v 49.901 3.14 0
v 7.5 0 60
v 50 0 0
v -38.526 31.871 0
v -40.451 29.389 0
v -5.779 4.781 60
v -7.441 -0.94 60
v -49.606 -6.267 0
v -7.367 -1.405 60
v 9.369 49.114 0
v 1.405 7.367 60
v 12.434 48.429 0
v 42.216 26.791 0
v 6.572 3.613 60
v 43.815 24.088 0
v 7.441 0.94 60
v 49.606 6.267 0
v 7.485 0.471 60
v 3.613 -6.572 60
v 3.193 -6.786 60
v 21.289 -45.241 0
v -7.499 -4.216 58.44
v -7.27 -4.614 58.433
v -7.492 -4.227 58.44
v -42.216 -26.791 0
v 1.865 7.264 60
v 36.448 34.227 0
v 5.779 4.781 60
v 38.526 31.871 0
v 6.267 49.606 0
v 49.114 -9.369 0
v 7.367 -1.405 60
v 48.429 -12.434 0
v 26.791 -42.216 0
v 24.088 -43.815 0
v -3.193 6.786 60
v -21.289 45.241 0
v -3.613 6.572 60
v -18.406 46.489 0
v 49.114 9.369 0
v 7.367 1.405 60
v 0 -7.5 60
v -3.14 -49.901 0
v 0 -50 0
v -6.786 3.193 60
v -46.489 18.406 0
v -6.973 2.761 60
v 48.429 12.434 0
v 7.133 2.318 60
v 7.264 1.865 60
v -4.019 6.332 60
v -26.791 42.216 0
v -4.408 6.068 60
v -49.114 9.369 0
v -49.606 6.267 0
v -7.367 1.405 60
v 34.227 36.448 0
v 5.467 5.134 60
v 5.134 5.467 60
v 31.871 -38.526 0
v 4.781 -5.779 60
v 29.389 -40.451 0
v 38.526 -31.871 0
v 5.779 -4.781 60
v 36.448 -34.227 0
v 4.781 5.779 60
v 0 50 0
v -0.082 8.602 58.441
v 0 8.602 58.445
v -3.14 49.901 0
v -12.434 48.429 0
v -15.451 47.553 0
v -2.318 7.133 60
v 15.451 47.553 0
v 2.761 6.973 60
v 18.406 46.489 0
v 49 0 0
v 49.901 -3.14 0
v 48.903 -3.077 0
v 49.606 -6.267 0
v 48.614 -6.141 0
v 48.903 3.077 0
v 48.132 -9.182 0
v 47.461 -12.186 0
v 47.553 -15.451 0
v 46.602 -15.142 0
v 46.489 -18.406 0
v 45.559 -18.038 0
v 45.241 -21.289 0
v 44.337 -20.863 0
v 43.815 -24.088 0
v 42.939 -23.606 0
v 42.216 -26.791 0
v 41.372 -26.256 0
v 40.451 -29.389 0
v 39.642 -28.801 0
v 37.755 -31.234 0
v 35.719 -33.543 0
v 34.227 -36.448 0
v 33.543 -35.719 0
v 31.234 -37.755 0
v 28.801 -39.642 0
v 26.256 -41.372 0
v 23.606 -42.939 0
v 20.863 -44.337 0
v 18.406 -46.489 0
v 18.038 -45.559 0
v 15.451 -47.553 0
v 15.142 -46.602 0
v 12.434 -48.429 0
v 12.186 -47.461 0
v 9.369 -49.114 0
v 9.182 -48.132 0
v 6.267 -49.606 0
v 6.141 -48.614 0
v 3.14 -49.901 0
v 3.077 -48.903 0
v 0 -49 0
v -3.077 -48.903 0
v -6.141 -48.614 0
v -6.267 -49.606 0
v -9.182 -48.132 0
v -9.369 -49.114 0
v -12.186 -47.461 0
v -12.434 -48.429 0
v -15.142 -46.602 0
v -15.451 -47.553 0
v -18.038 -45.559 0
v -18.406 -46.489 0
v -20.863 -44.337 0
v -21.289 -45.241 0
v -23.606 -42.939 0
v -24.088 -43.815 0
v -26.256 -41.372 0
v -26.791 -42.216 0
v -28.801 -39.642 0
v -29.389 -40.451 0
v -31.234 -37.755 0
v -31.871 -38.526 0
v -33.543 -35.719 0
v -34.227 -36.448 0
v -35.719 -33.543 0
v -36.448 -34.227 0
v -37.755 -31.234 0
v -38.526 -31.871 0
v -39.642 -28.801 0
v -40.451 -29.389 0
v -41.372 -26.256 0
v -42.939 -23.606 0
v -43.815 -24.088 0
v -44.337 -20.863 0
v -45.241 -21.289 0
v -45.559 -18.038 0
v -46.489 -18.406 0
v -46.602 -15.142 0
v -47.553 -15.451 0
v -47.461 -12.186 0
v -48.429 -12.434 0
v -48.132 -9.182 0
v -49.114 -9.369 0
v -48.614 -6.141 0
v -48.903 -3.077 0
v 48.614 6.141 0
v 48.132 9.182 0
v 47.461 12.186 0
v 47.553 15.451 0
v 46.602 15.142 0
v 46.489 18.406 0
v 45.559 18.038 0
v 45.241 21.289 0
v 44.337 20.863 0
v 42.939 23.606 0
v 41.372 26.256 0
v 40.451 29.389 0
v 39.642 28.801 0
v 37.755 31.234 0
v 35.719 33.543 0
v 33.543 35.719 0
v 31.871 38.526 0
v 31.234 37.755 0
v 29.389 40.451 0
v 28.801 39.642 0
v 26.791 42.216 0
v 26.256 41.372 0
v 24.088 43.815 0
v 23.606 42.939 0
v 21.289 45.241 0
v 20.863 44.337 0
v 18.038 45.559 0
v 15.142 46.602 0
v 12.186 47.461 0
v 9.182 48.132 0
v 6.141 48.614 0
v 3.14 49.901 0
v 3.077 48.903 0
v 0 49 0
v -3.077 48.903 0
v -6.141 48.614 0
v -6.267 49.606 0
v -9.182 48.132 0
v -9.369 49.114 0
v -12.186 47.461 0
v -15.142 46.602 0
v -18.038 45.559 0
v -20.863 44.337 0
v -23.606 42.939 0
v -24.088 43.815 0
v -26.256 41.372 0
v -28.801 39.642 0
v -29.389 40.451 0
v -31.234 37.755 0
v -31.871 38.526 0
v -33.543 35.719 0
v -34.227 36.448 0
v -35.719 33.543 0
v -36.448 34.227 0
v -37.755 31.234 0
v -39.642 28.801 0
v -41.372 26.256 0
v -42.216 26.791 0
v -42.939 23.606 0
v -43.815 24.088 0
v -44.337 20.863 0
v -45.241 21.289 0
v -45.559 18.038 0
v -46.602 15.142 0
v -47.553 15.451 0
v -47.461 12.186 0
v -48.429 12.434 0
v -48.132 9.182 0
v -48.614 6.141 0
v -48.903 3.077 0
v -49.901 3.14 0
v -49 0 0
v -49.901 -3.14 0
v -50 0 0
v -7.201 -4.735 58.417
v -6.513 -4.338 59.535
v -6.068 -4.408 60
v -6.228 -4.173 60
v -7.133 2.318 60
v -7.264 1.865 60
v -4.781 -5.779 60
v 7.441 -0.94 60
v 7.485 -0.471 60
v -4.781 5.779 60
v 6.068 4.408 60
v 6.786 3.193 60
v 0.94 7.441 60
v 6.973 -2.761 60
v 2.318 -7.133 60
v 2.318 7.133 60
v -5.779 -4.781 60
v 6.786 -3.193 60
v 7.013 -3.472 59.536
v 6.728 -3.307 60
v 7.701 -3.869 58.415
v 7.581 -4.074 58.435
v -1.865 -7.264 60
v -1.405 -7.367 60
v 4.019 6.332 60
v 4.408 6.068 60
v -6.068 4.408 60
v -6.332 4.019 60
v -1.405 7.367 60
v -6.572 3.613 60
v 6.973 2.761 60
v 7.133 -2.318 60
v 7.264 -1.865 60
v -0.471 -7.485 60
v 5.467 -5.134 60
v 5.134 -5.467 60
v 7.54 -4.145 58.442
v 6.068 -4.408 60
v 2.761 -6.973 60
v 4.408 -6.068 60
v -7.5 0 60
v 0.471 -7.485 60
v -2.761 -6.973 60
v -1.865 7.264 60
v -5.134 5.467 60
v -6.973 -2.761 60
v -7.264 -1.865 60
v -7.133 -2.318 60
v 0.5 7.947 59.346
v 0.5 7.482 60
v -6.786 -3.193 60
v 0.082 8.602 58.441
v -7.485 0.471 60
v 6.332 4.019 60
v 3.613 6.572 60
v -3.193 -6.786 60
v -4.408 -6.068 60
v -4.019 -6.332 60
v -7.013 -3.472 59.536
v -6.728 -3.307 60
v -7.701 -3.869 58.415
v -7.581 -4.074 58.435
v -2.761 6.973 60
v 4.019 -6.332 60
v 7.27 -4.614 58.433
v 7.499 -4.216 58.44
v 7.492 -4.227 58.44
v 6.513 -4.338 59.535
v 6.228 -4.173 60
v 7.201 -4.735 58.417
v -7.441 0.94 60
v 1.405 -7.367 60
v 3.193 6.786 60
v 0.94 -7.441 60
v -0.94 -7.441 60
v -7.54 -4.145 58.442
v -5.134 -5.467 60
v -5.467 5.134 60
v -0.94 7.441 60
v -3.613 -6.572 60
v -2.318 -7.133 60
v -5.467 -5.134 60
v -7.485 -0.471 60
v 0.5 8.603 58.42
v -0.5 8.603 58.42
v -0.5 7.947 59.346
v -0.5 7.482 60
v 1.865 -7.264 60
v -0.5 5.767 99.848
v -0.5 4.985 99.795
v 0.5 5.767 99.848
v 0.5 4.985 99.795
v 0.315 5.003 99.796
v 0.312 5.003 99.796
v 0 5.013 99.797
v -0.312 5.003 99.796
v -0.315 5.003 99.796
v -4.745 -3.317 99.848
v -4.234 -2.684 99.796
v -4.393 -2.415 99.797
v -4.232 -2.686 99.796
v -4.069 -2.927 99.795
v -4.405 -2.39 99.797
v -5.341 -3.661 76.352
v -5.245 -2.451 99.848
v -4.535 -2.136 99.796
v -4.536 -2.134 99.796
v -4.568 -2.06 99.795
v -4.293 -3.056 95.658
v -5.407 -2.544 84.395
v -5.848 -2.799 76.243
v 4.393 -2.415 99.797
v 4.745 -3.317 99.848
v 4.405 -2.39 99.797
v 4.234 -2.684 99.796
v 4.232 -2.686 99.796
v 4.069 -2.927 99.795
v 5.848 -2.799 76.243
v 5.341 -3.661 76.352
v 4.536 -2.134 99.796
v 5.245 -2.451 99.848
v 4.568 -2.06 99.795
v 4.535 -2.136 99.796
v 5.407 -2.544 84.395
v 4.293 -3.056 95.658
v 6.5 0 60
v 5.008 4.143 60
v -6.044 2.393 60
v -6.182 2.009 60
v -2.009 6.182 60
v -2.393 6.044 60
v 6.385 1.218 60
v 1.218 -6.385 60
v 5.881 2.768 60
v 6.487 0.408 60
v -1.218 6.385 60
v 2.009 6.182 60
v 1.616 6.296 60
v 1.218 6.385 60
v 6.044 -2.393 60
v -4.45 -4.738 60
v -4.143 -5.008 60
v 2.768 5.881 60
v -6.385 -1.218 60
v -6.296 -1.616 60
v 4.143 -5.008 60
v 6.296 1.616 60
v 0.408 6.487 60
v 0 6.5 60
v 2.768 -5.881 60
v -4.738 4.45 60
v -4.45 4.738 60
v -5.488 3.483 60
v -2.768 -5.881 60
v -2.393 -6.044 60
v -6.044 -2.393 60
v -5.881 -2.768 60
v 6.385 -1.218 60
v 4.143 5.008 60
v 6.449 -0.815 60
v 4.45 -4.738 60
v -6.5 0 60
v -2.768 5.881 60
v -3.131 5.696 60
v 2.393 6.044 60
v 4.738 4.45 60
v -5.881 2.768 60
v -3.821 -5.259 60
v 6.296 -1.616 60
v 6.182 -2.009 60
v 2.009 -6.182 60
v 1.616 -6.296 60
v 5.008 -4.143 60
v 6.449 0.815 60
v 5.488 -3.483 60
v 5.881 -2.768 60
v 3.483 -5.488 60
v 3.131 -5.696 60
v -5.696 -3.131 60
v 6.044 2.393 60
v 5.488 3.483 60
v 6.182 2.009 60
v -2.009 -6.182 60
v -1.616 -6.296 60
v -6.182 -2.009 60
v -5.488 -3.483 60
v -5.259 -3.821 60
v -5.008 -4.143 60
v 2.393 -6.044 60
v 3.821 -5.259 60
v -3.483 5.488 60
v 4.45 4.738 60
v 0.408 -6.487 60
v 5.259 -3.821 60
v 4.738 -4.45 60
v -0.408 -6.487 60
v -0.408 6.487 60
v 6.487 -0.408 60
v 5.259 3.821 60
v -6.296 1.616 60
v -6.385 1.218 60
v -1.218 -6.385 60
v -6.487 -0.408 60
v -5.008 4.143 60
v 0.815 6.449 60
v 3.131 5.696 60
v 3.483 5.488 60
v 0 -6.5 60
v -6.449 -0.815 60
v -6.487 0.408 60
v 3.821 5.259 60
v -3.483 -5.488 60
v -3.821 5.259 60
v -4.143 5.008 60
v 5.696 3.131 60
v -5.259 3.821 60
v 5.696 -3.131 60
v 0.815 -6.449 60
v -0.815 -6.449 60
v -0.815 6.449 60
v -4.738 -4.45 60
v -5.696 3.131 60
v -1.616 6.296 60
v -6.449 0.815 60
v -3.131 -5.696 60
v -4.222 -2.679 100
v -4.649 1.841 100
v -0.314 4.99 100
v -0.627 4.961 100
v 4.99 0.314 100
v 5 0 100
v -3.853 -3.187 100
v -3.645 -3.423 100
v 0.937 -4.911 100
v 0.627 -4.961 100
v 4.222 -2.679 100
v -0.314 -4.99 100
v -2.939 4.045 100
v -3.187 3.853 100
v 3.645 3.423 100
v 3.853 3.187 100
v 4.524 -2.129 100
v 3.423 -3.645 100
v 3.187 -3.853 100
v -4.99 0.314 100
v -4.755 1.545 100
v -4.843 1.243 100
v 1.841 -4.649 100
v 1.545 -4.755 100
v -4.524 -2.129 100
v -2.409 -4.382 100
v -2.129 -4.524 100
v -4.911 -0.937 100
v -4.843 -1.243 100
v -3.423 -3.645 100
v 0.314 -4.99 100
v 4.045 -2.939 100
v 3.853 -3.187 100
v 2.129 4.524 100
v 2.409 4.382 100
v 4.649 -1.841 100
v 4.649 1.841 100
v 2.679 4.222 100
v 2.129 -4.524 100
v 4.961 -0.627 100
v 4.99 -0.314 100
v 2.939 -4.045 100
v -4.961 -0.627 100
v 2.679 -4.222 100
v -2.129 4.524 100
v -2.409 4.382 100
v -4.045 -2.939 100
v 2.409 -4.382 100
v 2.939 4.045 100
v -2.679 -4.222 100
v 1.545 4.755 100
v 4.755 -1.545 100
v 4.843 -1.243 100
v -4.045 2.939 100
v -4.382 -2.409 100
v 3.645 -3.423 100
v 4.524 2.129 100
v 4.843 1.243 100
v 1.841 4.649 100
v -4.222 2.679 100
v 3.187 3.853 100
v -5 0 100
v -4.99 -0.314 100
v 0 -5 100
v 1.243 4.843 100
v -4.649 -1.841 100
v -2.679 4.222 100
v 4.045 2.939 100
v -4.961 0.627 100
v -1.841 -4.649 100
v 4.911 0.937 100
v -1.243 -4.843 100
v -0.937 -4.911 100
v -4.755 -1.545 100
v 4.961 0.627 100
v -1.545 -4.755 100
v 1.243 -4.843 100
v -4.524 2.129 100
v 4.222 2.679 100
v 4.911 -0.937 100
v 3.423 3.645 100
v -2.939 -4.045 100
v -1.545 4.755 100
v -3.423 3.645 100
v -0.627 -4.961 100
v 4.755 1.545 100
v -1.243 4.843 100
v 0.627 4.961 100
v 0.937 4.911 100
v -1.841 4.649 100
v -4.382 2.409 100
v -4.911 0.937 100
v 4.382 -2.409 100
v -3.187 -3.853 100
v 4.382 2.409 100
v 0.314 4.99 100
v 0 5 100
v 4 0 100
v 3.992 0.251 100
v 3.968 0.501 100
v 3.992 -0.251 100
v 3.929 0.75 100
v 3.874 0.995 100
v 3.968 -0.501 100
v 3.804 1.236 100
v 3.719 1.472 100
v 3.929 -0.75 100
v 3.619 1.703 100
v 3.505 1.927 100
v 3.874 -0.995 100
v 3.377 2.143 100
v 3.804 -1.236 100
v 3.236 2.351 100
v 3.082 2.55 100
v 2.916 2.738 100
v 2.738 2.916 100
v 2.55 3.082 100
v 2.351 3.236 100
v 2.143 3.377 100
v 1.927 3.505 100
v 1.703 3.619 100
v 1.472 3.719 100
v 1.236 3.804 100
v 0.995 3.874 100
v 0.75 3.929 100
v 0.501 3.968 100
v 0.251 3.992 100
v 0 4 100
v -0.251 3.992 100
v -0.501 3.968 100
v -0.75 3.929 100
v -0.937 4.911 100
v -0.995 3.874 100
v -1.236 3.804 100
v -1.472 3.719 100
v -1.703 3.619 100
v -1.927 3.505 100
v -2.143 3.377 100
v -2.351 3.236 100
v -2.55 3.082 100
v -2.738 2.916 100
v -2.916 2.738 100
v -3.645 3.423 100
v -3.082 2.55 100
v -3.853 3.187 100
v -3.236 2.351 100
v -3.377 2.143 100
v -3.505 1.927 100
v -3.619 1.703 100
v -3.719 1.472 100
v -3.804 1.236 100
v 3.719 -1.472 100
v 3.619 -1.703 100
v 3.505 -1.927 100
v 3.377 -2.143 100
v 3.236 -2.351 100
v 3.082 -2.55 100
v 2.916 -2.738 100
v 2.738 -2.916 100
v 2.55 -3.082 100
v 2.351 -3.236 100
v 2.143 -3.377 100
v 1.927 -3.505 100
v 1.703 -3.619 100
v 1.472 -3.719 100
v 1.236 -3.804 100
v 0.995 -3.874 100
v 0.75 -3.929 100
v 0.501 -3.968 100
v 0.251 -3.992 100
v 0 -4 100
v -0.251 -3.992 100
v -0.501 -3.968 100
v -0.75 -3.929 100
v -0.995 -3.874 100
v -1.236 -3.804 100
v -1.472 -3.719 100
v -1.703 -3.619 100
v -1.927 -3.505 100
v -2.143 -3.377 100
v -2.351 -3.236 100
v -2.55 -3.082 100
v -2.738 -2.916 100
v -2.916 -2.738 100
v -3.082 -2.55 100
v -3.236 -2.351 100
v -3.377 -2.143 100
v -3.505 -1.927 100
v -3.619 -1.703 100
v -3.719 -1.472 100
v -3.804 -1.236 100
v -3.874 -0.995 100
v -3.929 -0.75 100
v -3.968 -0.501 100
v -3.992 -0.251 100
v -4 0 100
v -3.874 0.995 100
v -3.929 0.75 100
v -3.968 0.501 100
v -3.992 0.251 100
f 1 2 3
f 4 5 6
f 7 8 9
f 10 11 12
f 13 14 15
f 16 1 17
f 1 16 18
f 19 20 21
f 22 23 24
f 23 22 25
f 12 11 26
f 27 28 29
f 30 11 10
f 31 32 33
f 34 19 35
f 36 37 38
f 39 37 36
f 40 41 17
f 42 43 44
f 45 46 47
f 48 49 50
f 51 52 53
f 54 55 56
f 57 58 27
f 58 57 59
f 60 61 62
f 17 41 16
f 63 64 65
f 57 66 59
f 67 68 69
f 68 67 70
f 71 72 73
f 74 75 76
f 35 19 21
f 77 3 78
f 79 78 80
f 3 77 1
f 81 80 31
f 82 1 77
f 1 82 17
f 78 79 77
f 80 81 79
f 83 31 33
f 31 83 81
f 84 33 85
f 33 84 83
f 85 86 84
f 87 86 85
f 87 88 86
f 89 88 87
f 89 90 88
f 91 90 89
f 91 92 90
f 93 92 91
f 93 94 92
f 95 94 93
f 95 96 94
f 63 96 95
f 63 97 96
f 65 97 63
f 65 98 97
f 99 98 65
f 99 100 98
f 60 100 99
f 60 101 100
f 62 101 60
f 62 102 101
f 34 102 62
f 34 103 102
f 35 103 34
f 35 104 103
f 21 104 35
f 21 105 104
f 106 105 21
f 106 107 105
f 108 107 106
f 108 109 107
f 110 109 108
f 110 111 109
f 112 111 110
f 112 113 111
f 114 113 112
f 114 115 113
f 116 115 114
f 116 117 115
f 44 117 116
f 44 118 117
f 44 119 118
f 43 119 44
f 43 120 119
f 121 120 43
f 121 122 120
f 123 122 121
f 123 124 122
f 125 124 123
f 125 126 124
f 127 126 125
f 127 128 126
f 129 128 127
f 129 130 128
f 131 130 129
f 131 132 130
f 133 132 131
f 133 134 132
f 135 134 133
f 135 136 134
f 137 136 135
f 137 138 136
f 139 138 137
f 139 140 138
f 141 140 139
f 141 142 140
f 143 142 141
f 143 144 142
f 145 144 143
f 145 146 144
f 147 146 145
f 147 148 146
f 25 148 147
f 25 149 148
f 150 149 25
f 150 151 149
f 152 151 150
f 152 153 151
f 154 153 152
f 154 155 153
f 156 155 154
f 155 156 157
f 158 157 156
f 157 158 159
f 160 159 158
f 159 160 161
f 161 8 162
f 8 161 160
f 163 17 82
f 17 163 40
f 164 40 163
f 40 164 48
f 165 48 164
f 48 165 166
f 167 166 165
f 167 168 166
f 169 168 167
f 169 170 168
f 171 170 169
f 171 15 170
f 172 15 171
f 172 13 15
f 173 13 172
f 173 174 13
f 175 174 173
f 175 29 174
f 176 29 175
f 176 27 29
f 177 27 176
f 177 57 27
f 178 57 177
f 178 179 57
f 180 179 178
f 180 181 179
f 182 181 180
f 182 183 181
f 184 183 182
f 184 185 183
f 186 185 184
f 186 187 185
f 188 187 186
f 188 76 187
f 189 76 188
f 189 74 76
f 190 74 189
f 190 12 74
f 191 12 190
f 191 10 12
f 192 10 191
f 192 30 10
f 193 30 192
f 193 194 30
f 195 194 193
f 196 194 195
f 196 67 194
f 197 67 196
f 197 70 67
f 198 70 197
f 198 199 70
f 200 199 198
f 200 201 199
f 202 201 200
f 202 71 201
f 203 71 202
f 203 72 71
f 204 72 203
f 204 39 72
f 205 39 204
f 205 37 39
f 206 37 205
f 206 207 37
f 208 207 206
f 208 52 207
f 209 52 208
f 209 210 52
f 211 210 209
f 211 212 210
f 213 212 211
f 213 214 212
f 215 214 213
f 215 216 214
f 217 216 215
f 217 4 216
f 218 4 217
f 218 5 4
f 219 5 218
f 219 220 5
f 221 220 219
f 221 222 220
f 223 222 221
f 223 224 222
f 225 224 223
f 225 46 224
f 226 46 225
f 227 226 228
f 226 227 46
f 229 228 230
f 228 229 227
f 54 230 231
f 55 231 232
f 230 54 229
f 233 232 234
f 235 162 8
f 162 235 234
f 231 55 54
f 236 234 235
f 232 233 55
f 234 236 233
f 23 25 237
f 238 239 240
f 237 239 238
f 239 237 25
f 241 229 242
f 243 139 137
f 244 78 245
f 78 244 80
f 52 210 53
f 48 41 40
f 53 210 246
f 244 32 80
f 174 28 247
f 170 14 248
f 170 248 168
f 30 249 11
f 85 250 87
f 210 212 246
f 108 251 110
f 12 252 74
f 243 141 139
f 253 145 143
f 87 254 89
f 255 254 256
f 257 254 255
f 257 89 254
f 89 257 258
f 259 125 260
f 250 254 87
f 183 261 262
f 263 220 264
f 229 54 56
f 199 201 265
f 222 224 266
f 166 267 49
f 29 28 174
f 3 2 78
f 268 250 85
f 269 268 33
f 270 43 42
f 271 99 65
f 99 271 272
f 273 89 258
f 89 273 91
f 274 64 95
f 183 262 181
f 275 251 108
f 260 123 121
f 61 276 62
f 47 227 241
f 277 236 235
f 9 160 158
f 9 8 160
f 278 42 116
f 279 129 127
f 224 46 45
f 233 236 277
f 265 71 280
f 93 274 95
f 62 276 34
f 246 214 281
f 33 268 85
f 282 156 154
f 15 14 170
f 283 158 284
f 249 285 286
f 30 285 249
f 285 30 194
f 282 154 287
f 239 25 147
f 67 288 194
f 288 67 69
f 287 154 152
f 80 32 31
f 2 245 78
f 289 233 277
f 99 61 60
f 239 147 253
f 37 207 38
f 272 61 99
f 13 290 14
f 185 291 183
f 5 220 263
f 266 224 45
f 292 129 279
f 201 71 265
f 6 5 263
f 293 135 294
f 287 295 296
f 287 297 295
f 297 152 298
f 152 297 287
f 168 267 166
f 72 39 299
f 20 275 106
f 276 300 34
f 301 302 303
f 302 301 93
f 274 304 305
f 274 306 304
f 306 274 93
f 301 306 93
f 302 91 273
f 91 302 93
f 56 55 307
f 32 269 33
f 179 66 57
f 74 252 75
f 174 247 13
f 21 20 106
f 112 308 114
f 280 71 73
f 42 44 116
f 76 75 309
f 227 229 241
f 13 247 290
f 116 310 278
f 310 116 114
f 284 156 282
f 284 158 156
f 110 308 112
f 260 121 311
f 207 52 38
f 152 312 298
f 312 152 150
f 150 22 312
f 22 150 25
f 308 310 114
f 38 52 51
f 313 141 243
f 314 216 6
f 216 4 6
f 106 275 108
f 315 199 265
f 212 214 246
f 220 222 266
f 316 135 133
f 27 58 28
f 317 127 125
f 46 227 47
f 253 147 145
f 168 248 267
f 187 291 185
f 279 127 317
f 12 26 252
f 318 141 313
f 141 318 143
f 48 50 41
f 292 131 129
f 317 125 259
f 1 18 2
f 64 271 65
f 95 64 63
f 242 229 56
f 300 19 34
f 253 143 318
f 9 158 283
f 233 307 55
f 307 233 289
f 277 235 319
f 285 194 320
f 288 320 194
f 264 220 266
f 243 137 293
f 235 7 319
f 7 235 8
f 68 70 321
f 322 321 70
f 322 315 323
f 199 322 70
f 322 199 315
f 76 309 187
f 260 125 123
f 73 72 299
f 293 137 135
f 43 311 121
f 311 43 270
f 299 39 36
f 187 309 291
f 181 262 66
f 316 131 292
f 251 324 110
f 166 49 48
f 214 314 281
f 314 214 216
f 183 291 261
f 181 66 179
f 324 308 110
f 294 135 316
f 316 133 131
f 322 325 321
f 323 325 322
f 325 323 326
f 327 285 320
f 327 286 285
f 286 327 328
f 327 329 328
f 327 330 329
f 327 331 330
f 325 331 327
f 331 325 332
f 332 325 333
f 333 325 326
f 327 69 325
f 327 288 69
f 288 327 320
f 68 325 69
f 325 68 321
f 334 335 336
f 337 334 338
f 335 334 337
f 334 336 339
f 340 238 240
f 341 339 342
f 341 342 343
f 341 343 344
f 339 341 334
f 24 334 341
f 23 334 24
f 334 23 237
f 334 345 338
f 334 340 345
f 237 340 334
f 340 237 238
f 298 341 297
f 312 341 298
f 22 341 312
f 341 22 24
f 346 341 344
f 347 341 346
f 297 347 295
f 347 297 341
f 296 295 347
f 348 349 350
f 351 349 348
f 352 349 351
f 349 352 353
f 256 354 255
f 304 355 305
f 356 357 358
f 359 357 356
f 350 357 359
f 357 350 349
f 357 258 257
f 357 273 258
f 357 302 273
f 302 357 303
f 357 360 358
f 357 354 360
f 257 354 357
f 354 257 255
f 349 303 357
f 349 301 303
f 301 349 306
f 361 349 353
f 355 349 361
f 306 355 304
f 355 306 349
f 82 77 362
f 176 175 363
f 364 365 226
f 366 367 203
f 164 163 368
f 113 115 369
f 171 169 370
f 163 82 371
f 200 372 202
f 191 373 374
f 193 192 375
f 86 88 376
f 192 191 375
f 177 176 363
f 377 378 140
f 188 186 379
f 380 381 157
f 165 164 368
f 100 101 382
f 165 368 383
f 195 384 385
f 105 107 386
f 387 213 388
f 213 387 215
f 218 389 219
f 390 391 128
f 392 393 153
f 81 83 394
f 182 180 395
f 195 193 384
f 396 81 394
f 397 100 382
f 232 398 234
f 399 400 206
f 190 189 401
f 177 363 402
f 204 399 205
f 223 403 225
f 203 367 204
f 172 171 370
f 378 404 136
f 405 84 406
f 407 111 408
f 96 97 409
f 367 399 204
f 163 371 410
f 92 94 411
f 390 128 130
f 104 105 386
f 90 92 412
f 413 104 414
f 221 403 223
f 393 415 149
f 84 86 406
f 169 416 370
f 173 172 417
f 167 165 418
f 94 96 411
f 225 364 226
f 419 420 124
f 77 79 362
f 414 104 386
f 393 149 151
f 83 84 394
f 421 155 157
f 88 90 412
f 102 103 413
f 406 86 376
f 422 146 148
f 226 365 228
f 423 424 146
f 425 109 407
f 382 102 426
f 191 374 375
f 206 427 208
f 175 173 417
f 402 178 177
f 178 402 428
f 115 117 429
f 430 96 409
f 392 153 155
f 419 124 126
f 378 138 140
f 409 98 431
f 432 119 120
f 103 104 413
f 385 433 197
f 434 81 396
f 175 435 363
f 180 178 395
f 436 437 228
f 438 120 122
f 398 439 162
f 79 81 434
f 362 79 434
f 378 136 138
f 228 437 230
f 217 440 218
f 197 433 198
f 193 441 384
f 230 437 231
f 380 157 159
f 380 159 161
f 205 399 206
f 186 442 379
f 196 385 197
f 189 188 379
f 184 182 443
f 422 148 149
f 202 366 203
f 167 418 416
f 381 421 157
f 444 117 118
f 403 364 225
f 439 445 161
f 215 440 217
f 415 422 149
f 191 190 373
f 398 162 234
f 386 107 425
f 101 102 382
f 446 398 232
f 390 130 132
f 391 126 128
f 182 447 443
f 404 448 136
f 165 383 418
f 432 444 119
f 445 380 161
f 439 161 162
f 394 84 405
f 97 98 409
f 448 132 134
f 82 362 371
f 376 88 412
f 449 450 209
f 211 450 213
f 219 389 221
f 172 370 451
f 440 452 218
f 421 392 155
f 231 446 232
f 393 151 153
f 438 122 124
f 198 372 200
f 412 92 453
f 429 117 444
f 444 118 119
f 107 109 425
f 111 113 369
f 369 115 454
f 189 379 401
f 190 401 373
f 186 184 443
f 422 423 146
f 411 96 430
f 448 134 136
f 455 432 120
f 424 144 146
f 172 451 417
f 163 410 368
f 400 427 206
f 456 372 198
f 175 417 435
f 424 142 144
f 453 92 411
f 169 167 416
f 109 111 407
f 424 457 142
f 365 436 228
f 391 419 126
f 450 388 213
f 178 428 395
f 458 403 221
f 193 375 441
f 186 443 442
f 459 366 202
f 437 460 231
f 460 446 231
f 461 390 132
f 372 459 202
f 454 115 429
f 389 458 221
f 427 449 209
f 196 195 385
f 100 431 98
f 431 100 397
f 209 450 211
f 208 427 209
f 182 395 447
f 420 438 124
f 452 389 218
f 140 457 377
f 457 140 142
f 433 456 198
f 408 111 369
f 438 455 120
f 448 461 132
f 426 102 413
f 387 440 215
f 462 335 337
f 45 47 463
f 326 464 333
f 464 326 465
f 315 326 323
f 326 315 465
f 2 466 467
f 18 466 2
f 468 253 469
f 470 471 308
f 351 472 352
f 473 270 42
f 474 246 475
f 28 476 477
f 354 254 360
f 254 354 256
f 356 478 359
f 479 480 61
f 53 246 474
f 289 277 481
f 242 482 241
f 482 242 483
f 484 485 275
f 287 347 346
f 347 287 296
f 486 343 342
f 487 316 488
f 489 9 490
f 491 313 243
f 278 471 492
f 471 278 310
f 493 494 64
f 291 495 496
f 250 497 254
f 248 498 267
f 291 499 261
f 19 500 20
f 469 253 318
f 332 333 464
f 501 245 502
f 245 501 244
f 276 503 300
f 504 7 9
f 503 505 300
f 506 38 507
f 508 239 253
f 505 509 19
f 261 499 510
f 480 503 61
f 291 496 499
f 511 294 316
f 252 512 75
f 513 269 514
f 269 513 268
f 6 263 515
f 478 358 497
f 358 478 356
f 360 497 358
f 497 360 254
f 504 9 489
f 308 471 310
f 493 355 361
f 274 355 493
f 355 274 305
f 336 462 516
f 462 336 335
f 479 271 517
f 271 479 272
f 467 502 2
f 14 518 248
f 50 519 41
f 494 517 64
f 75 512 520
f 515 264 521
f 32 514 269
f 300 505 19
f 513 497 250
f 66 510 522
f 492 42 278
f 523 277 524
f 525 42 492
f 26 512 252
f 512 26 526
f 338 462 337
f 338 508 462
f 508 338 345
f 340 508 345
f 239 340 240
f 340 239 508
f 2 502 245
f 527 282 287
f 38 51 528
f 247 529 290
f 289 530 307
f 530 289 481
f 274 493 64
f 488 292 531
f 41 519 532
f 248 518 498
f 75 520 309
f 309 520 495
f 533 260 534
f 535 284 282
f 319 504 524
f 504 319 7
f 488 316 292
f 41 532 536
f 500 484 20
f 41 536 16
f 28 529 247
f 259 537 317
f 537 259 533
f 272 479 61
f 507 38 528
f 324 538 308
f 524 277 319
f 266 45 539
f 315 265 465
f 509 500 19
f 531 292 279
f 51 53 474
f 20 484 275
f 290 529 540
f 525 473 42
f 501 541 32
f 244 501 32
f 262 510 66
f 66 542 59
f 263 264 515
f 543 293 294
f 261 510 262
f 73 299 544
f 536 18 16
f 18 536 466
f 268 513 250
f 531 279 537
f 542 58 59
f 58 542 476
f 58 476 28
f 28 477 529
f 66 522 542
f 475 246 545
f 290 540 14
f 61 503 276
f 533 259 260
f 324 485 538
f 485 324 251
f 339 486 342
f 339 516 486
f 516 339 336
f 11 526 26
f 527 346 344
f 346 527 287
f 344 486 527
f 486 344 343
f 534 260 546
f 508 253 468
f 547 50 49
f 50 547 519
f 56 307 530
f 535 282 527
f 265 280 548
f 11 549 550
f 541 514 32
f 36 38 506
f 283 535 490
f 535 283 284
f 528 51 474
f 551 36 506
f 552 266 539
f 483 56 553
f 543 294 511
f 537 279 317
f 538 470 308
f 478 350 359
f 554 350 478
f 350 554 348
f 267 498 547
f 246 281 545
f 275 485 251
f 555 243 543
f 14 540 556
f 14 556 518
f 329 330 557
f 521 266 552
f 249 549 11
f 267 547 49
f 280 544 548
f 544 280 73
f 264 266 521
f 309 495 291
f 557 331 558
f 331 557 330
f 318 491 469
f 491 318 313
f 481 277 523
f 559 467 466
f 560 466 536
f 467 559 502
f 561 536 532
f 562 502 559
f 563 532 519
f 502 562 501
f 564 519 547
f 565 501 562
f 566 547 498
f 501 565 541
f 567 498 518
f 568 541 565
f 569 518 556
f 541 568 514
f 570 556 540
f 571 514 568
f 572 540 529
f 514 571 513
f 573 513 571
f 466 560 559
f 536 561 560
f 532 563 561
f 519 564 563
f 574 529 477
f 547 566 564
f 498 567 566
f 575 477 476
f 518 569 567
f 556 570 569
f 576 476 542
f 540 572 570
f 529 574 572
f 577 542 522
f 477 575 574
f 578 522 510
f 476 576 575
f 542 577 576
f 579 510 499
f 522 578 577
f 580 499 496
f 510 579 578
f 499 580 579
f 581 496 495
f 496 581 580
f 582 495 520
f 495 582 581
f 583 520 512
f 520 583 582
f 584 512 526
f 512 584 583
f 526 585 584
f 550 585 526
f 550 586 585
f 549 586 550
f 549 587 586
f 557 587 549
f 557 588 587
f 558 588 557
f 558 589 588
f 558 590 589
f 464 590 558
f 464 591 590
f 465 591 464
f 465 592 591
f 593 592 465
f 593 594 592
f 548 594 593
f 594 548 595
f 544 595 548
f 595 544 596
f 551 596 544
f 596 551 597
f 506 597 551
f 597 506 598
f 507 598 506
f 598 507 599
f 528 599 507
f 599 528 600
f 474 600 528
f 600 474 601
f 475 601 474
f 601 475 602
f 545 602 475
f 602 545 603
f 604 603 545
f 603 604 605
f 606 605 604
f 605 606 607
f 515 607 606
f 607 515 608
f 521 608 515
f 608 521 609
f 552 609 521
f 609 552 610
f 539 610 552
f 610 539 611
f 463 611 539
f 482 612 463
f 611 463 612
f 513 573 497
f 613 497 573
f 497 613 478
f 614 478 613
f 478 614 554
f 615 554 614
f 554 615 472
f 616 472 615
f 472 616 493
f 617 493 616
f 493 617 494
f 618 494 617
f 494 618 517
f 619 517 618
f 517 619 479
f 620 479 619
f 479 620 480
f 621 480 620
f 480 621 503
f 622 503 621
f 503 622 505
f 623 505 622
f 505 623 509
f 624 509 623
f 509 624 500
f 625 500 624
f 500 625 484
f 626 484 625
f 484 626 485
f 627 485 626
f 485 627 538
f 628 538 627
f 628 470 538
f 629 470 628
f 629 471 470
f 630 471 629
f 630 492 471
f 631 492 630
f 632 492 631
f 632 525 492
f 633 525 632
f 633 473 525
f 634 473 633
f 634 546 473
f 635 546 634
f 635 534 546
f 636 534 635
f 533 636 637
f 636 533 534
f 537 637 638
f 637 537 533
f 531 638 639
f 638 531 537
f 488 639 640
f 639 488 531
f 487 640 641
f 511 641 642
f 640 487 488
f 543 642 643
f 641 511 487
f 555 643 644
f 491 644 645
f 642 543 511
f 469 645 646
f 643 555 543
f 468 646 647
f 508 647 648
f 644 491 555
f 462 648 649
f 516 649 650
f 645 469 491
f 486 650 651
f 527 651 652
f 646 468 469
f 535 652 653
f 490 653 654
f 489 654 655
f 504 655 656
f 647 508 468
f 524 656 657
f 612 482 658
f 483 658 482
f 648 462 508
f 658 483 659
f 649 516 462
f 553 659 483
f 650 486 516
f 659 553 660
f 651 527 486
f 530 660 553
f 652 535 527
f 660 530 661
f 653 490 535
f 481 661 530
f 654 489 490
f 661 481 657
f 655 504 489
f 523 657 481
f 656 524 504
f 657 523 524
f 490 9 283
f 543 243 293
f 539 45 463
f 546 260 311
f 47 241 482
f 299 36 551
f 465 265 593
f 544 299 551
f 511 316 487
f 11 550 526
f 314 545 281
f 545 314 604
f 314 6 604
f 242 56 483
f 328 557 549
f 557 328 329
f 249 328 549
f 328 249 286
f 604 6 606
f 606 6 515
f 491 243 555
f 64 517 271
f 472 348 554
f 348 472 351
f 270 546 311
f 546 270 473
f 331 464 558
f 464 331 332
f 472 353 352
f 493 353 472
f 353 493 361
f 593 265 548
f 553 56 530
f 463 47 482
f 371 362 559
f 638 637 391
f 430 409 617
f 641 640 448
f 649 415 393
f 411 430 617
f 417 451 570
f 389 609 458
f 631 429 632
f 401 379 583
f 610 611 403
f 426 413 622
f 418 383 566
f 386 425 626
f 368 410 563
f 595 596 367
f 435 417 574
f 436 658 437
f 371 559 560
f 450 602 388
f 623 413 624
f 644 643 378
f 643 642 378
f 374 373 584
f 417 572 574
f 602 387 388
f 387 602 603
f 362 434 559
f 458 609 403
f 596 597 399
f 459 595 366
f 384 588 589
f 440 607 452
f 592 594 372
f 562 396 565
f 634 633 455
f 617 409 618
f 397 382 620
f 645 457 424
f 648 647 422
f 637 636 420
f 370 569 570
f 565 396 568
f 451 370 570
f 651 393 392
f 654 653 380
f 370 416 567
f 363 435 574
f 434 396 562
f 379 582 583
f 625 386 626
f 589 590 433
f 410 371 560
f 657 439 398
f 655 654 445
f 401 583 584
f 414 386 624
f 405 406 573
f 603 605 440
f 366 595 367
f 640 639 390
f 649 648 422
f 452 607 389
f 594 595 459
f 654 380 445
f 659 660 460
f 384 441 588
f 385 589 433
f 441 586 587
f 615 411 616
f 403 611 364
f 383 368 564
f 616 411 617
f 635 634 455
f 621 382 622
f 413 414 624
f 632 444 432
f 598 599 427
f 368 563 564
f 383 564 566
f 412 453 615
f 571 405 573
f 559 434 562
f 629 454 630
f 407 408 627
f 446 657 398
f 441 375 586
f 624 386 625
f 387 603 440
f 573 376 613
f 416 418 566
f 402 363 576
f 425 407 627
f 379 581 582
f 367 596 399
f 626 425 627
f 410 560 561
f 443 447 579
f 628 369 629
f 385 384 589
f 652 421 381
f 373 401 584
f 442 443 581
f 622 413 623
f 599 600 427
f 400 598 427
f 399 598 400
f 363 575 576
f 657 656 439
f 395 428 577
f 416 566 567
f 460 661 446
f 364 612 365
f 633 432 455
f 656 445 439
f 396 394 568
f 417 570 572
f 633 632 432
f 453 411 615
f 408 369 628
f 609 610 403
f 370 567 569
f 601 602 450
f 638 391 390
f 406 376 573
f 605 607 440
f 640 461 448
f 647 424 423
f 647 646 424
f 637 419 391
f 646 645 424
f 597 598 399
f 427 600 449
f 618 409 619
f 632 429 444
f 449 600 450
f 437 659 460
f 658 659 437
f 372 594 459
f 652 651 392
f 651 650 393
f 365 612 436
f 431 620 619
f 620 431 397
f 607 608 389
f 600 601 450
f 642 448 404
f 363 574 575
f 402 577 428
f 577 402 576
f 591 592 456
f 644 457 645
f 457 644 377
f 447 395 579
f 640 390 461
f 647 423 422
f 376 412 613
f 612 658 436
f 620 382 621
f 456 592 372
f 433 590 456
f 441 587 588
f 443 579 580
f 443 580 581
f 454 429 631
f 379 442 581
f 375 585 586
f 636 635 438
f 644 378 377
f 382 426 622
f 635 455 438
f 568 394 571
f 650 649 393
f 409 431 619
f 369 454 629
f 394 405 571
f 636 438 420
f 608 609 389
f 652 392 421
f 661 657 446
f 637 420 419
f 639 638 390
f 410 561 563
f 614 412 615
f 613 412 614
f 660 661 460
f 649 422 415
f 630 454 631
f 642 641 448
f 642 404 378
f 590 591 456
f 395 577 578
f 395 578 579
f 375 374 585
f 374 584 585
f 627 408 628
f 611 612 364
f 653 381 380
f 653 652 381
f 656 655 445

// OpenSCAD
// variables
size = 100; // [50:S,100:M,150:L,200:XL]
wallthickness = 1; // [0.5:S,1:M,1.5:L]
resolution = 100; // [100:rough,150:middle,200:fine]

// model
union(){
	difference(){
		union(){
			translate([0,0,0])cylinder(h = size*0.6, r1 = size/2, r2 = size*0.15/2, $fn = resolution);
			translate([-0.5,-0.6,0]) translate([0,size*0.12,0]) rotate([1/tan(size*0.1/(size*0.4)*180/PI),0,0]) cube([1,1.2,size]);
			rotate([0,0,120]) translate([-0.5,-0.6,0]) translate([0,size*0.12,0]) rotate([1/tan(size*0.1/(size*0.4)*180/PI),0,0]) cube([1,1.2,size]);
			rotate([0,0,240]) translate([-0.5,-0.6,0]) translate([0,size*0.12,0]) rotate([1/tan(size*0.1/(size*0.4)*180/PI),0,0]) cube([1,1.2,size]);
		}
		translate([0,0,0])cylinder(h = size*0.6, r1 = (size)/2-wallthickness, r2 = (size)*0.15/2-wallthickness, $fn = resolution);
	}
	difference(){
		translate([0,0,size*0.6])cylinder(h = size*0.4, r1 = size*0.15/2, r2 = size*0.1/2, $fn = resolution);
		translate([0,0,size*0.6])cylinder(h = size*0.4, r1 = (size)*0.15/2-wallthickness, r2 = (size)*0.1/2-wallthickness, $fn = resolution);
	}
}
